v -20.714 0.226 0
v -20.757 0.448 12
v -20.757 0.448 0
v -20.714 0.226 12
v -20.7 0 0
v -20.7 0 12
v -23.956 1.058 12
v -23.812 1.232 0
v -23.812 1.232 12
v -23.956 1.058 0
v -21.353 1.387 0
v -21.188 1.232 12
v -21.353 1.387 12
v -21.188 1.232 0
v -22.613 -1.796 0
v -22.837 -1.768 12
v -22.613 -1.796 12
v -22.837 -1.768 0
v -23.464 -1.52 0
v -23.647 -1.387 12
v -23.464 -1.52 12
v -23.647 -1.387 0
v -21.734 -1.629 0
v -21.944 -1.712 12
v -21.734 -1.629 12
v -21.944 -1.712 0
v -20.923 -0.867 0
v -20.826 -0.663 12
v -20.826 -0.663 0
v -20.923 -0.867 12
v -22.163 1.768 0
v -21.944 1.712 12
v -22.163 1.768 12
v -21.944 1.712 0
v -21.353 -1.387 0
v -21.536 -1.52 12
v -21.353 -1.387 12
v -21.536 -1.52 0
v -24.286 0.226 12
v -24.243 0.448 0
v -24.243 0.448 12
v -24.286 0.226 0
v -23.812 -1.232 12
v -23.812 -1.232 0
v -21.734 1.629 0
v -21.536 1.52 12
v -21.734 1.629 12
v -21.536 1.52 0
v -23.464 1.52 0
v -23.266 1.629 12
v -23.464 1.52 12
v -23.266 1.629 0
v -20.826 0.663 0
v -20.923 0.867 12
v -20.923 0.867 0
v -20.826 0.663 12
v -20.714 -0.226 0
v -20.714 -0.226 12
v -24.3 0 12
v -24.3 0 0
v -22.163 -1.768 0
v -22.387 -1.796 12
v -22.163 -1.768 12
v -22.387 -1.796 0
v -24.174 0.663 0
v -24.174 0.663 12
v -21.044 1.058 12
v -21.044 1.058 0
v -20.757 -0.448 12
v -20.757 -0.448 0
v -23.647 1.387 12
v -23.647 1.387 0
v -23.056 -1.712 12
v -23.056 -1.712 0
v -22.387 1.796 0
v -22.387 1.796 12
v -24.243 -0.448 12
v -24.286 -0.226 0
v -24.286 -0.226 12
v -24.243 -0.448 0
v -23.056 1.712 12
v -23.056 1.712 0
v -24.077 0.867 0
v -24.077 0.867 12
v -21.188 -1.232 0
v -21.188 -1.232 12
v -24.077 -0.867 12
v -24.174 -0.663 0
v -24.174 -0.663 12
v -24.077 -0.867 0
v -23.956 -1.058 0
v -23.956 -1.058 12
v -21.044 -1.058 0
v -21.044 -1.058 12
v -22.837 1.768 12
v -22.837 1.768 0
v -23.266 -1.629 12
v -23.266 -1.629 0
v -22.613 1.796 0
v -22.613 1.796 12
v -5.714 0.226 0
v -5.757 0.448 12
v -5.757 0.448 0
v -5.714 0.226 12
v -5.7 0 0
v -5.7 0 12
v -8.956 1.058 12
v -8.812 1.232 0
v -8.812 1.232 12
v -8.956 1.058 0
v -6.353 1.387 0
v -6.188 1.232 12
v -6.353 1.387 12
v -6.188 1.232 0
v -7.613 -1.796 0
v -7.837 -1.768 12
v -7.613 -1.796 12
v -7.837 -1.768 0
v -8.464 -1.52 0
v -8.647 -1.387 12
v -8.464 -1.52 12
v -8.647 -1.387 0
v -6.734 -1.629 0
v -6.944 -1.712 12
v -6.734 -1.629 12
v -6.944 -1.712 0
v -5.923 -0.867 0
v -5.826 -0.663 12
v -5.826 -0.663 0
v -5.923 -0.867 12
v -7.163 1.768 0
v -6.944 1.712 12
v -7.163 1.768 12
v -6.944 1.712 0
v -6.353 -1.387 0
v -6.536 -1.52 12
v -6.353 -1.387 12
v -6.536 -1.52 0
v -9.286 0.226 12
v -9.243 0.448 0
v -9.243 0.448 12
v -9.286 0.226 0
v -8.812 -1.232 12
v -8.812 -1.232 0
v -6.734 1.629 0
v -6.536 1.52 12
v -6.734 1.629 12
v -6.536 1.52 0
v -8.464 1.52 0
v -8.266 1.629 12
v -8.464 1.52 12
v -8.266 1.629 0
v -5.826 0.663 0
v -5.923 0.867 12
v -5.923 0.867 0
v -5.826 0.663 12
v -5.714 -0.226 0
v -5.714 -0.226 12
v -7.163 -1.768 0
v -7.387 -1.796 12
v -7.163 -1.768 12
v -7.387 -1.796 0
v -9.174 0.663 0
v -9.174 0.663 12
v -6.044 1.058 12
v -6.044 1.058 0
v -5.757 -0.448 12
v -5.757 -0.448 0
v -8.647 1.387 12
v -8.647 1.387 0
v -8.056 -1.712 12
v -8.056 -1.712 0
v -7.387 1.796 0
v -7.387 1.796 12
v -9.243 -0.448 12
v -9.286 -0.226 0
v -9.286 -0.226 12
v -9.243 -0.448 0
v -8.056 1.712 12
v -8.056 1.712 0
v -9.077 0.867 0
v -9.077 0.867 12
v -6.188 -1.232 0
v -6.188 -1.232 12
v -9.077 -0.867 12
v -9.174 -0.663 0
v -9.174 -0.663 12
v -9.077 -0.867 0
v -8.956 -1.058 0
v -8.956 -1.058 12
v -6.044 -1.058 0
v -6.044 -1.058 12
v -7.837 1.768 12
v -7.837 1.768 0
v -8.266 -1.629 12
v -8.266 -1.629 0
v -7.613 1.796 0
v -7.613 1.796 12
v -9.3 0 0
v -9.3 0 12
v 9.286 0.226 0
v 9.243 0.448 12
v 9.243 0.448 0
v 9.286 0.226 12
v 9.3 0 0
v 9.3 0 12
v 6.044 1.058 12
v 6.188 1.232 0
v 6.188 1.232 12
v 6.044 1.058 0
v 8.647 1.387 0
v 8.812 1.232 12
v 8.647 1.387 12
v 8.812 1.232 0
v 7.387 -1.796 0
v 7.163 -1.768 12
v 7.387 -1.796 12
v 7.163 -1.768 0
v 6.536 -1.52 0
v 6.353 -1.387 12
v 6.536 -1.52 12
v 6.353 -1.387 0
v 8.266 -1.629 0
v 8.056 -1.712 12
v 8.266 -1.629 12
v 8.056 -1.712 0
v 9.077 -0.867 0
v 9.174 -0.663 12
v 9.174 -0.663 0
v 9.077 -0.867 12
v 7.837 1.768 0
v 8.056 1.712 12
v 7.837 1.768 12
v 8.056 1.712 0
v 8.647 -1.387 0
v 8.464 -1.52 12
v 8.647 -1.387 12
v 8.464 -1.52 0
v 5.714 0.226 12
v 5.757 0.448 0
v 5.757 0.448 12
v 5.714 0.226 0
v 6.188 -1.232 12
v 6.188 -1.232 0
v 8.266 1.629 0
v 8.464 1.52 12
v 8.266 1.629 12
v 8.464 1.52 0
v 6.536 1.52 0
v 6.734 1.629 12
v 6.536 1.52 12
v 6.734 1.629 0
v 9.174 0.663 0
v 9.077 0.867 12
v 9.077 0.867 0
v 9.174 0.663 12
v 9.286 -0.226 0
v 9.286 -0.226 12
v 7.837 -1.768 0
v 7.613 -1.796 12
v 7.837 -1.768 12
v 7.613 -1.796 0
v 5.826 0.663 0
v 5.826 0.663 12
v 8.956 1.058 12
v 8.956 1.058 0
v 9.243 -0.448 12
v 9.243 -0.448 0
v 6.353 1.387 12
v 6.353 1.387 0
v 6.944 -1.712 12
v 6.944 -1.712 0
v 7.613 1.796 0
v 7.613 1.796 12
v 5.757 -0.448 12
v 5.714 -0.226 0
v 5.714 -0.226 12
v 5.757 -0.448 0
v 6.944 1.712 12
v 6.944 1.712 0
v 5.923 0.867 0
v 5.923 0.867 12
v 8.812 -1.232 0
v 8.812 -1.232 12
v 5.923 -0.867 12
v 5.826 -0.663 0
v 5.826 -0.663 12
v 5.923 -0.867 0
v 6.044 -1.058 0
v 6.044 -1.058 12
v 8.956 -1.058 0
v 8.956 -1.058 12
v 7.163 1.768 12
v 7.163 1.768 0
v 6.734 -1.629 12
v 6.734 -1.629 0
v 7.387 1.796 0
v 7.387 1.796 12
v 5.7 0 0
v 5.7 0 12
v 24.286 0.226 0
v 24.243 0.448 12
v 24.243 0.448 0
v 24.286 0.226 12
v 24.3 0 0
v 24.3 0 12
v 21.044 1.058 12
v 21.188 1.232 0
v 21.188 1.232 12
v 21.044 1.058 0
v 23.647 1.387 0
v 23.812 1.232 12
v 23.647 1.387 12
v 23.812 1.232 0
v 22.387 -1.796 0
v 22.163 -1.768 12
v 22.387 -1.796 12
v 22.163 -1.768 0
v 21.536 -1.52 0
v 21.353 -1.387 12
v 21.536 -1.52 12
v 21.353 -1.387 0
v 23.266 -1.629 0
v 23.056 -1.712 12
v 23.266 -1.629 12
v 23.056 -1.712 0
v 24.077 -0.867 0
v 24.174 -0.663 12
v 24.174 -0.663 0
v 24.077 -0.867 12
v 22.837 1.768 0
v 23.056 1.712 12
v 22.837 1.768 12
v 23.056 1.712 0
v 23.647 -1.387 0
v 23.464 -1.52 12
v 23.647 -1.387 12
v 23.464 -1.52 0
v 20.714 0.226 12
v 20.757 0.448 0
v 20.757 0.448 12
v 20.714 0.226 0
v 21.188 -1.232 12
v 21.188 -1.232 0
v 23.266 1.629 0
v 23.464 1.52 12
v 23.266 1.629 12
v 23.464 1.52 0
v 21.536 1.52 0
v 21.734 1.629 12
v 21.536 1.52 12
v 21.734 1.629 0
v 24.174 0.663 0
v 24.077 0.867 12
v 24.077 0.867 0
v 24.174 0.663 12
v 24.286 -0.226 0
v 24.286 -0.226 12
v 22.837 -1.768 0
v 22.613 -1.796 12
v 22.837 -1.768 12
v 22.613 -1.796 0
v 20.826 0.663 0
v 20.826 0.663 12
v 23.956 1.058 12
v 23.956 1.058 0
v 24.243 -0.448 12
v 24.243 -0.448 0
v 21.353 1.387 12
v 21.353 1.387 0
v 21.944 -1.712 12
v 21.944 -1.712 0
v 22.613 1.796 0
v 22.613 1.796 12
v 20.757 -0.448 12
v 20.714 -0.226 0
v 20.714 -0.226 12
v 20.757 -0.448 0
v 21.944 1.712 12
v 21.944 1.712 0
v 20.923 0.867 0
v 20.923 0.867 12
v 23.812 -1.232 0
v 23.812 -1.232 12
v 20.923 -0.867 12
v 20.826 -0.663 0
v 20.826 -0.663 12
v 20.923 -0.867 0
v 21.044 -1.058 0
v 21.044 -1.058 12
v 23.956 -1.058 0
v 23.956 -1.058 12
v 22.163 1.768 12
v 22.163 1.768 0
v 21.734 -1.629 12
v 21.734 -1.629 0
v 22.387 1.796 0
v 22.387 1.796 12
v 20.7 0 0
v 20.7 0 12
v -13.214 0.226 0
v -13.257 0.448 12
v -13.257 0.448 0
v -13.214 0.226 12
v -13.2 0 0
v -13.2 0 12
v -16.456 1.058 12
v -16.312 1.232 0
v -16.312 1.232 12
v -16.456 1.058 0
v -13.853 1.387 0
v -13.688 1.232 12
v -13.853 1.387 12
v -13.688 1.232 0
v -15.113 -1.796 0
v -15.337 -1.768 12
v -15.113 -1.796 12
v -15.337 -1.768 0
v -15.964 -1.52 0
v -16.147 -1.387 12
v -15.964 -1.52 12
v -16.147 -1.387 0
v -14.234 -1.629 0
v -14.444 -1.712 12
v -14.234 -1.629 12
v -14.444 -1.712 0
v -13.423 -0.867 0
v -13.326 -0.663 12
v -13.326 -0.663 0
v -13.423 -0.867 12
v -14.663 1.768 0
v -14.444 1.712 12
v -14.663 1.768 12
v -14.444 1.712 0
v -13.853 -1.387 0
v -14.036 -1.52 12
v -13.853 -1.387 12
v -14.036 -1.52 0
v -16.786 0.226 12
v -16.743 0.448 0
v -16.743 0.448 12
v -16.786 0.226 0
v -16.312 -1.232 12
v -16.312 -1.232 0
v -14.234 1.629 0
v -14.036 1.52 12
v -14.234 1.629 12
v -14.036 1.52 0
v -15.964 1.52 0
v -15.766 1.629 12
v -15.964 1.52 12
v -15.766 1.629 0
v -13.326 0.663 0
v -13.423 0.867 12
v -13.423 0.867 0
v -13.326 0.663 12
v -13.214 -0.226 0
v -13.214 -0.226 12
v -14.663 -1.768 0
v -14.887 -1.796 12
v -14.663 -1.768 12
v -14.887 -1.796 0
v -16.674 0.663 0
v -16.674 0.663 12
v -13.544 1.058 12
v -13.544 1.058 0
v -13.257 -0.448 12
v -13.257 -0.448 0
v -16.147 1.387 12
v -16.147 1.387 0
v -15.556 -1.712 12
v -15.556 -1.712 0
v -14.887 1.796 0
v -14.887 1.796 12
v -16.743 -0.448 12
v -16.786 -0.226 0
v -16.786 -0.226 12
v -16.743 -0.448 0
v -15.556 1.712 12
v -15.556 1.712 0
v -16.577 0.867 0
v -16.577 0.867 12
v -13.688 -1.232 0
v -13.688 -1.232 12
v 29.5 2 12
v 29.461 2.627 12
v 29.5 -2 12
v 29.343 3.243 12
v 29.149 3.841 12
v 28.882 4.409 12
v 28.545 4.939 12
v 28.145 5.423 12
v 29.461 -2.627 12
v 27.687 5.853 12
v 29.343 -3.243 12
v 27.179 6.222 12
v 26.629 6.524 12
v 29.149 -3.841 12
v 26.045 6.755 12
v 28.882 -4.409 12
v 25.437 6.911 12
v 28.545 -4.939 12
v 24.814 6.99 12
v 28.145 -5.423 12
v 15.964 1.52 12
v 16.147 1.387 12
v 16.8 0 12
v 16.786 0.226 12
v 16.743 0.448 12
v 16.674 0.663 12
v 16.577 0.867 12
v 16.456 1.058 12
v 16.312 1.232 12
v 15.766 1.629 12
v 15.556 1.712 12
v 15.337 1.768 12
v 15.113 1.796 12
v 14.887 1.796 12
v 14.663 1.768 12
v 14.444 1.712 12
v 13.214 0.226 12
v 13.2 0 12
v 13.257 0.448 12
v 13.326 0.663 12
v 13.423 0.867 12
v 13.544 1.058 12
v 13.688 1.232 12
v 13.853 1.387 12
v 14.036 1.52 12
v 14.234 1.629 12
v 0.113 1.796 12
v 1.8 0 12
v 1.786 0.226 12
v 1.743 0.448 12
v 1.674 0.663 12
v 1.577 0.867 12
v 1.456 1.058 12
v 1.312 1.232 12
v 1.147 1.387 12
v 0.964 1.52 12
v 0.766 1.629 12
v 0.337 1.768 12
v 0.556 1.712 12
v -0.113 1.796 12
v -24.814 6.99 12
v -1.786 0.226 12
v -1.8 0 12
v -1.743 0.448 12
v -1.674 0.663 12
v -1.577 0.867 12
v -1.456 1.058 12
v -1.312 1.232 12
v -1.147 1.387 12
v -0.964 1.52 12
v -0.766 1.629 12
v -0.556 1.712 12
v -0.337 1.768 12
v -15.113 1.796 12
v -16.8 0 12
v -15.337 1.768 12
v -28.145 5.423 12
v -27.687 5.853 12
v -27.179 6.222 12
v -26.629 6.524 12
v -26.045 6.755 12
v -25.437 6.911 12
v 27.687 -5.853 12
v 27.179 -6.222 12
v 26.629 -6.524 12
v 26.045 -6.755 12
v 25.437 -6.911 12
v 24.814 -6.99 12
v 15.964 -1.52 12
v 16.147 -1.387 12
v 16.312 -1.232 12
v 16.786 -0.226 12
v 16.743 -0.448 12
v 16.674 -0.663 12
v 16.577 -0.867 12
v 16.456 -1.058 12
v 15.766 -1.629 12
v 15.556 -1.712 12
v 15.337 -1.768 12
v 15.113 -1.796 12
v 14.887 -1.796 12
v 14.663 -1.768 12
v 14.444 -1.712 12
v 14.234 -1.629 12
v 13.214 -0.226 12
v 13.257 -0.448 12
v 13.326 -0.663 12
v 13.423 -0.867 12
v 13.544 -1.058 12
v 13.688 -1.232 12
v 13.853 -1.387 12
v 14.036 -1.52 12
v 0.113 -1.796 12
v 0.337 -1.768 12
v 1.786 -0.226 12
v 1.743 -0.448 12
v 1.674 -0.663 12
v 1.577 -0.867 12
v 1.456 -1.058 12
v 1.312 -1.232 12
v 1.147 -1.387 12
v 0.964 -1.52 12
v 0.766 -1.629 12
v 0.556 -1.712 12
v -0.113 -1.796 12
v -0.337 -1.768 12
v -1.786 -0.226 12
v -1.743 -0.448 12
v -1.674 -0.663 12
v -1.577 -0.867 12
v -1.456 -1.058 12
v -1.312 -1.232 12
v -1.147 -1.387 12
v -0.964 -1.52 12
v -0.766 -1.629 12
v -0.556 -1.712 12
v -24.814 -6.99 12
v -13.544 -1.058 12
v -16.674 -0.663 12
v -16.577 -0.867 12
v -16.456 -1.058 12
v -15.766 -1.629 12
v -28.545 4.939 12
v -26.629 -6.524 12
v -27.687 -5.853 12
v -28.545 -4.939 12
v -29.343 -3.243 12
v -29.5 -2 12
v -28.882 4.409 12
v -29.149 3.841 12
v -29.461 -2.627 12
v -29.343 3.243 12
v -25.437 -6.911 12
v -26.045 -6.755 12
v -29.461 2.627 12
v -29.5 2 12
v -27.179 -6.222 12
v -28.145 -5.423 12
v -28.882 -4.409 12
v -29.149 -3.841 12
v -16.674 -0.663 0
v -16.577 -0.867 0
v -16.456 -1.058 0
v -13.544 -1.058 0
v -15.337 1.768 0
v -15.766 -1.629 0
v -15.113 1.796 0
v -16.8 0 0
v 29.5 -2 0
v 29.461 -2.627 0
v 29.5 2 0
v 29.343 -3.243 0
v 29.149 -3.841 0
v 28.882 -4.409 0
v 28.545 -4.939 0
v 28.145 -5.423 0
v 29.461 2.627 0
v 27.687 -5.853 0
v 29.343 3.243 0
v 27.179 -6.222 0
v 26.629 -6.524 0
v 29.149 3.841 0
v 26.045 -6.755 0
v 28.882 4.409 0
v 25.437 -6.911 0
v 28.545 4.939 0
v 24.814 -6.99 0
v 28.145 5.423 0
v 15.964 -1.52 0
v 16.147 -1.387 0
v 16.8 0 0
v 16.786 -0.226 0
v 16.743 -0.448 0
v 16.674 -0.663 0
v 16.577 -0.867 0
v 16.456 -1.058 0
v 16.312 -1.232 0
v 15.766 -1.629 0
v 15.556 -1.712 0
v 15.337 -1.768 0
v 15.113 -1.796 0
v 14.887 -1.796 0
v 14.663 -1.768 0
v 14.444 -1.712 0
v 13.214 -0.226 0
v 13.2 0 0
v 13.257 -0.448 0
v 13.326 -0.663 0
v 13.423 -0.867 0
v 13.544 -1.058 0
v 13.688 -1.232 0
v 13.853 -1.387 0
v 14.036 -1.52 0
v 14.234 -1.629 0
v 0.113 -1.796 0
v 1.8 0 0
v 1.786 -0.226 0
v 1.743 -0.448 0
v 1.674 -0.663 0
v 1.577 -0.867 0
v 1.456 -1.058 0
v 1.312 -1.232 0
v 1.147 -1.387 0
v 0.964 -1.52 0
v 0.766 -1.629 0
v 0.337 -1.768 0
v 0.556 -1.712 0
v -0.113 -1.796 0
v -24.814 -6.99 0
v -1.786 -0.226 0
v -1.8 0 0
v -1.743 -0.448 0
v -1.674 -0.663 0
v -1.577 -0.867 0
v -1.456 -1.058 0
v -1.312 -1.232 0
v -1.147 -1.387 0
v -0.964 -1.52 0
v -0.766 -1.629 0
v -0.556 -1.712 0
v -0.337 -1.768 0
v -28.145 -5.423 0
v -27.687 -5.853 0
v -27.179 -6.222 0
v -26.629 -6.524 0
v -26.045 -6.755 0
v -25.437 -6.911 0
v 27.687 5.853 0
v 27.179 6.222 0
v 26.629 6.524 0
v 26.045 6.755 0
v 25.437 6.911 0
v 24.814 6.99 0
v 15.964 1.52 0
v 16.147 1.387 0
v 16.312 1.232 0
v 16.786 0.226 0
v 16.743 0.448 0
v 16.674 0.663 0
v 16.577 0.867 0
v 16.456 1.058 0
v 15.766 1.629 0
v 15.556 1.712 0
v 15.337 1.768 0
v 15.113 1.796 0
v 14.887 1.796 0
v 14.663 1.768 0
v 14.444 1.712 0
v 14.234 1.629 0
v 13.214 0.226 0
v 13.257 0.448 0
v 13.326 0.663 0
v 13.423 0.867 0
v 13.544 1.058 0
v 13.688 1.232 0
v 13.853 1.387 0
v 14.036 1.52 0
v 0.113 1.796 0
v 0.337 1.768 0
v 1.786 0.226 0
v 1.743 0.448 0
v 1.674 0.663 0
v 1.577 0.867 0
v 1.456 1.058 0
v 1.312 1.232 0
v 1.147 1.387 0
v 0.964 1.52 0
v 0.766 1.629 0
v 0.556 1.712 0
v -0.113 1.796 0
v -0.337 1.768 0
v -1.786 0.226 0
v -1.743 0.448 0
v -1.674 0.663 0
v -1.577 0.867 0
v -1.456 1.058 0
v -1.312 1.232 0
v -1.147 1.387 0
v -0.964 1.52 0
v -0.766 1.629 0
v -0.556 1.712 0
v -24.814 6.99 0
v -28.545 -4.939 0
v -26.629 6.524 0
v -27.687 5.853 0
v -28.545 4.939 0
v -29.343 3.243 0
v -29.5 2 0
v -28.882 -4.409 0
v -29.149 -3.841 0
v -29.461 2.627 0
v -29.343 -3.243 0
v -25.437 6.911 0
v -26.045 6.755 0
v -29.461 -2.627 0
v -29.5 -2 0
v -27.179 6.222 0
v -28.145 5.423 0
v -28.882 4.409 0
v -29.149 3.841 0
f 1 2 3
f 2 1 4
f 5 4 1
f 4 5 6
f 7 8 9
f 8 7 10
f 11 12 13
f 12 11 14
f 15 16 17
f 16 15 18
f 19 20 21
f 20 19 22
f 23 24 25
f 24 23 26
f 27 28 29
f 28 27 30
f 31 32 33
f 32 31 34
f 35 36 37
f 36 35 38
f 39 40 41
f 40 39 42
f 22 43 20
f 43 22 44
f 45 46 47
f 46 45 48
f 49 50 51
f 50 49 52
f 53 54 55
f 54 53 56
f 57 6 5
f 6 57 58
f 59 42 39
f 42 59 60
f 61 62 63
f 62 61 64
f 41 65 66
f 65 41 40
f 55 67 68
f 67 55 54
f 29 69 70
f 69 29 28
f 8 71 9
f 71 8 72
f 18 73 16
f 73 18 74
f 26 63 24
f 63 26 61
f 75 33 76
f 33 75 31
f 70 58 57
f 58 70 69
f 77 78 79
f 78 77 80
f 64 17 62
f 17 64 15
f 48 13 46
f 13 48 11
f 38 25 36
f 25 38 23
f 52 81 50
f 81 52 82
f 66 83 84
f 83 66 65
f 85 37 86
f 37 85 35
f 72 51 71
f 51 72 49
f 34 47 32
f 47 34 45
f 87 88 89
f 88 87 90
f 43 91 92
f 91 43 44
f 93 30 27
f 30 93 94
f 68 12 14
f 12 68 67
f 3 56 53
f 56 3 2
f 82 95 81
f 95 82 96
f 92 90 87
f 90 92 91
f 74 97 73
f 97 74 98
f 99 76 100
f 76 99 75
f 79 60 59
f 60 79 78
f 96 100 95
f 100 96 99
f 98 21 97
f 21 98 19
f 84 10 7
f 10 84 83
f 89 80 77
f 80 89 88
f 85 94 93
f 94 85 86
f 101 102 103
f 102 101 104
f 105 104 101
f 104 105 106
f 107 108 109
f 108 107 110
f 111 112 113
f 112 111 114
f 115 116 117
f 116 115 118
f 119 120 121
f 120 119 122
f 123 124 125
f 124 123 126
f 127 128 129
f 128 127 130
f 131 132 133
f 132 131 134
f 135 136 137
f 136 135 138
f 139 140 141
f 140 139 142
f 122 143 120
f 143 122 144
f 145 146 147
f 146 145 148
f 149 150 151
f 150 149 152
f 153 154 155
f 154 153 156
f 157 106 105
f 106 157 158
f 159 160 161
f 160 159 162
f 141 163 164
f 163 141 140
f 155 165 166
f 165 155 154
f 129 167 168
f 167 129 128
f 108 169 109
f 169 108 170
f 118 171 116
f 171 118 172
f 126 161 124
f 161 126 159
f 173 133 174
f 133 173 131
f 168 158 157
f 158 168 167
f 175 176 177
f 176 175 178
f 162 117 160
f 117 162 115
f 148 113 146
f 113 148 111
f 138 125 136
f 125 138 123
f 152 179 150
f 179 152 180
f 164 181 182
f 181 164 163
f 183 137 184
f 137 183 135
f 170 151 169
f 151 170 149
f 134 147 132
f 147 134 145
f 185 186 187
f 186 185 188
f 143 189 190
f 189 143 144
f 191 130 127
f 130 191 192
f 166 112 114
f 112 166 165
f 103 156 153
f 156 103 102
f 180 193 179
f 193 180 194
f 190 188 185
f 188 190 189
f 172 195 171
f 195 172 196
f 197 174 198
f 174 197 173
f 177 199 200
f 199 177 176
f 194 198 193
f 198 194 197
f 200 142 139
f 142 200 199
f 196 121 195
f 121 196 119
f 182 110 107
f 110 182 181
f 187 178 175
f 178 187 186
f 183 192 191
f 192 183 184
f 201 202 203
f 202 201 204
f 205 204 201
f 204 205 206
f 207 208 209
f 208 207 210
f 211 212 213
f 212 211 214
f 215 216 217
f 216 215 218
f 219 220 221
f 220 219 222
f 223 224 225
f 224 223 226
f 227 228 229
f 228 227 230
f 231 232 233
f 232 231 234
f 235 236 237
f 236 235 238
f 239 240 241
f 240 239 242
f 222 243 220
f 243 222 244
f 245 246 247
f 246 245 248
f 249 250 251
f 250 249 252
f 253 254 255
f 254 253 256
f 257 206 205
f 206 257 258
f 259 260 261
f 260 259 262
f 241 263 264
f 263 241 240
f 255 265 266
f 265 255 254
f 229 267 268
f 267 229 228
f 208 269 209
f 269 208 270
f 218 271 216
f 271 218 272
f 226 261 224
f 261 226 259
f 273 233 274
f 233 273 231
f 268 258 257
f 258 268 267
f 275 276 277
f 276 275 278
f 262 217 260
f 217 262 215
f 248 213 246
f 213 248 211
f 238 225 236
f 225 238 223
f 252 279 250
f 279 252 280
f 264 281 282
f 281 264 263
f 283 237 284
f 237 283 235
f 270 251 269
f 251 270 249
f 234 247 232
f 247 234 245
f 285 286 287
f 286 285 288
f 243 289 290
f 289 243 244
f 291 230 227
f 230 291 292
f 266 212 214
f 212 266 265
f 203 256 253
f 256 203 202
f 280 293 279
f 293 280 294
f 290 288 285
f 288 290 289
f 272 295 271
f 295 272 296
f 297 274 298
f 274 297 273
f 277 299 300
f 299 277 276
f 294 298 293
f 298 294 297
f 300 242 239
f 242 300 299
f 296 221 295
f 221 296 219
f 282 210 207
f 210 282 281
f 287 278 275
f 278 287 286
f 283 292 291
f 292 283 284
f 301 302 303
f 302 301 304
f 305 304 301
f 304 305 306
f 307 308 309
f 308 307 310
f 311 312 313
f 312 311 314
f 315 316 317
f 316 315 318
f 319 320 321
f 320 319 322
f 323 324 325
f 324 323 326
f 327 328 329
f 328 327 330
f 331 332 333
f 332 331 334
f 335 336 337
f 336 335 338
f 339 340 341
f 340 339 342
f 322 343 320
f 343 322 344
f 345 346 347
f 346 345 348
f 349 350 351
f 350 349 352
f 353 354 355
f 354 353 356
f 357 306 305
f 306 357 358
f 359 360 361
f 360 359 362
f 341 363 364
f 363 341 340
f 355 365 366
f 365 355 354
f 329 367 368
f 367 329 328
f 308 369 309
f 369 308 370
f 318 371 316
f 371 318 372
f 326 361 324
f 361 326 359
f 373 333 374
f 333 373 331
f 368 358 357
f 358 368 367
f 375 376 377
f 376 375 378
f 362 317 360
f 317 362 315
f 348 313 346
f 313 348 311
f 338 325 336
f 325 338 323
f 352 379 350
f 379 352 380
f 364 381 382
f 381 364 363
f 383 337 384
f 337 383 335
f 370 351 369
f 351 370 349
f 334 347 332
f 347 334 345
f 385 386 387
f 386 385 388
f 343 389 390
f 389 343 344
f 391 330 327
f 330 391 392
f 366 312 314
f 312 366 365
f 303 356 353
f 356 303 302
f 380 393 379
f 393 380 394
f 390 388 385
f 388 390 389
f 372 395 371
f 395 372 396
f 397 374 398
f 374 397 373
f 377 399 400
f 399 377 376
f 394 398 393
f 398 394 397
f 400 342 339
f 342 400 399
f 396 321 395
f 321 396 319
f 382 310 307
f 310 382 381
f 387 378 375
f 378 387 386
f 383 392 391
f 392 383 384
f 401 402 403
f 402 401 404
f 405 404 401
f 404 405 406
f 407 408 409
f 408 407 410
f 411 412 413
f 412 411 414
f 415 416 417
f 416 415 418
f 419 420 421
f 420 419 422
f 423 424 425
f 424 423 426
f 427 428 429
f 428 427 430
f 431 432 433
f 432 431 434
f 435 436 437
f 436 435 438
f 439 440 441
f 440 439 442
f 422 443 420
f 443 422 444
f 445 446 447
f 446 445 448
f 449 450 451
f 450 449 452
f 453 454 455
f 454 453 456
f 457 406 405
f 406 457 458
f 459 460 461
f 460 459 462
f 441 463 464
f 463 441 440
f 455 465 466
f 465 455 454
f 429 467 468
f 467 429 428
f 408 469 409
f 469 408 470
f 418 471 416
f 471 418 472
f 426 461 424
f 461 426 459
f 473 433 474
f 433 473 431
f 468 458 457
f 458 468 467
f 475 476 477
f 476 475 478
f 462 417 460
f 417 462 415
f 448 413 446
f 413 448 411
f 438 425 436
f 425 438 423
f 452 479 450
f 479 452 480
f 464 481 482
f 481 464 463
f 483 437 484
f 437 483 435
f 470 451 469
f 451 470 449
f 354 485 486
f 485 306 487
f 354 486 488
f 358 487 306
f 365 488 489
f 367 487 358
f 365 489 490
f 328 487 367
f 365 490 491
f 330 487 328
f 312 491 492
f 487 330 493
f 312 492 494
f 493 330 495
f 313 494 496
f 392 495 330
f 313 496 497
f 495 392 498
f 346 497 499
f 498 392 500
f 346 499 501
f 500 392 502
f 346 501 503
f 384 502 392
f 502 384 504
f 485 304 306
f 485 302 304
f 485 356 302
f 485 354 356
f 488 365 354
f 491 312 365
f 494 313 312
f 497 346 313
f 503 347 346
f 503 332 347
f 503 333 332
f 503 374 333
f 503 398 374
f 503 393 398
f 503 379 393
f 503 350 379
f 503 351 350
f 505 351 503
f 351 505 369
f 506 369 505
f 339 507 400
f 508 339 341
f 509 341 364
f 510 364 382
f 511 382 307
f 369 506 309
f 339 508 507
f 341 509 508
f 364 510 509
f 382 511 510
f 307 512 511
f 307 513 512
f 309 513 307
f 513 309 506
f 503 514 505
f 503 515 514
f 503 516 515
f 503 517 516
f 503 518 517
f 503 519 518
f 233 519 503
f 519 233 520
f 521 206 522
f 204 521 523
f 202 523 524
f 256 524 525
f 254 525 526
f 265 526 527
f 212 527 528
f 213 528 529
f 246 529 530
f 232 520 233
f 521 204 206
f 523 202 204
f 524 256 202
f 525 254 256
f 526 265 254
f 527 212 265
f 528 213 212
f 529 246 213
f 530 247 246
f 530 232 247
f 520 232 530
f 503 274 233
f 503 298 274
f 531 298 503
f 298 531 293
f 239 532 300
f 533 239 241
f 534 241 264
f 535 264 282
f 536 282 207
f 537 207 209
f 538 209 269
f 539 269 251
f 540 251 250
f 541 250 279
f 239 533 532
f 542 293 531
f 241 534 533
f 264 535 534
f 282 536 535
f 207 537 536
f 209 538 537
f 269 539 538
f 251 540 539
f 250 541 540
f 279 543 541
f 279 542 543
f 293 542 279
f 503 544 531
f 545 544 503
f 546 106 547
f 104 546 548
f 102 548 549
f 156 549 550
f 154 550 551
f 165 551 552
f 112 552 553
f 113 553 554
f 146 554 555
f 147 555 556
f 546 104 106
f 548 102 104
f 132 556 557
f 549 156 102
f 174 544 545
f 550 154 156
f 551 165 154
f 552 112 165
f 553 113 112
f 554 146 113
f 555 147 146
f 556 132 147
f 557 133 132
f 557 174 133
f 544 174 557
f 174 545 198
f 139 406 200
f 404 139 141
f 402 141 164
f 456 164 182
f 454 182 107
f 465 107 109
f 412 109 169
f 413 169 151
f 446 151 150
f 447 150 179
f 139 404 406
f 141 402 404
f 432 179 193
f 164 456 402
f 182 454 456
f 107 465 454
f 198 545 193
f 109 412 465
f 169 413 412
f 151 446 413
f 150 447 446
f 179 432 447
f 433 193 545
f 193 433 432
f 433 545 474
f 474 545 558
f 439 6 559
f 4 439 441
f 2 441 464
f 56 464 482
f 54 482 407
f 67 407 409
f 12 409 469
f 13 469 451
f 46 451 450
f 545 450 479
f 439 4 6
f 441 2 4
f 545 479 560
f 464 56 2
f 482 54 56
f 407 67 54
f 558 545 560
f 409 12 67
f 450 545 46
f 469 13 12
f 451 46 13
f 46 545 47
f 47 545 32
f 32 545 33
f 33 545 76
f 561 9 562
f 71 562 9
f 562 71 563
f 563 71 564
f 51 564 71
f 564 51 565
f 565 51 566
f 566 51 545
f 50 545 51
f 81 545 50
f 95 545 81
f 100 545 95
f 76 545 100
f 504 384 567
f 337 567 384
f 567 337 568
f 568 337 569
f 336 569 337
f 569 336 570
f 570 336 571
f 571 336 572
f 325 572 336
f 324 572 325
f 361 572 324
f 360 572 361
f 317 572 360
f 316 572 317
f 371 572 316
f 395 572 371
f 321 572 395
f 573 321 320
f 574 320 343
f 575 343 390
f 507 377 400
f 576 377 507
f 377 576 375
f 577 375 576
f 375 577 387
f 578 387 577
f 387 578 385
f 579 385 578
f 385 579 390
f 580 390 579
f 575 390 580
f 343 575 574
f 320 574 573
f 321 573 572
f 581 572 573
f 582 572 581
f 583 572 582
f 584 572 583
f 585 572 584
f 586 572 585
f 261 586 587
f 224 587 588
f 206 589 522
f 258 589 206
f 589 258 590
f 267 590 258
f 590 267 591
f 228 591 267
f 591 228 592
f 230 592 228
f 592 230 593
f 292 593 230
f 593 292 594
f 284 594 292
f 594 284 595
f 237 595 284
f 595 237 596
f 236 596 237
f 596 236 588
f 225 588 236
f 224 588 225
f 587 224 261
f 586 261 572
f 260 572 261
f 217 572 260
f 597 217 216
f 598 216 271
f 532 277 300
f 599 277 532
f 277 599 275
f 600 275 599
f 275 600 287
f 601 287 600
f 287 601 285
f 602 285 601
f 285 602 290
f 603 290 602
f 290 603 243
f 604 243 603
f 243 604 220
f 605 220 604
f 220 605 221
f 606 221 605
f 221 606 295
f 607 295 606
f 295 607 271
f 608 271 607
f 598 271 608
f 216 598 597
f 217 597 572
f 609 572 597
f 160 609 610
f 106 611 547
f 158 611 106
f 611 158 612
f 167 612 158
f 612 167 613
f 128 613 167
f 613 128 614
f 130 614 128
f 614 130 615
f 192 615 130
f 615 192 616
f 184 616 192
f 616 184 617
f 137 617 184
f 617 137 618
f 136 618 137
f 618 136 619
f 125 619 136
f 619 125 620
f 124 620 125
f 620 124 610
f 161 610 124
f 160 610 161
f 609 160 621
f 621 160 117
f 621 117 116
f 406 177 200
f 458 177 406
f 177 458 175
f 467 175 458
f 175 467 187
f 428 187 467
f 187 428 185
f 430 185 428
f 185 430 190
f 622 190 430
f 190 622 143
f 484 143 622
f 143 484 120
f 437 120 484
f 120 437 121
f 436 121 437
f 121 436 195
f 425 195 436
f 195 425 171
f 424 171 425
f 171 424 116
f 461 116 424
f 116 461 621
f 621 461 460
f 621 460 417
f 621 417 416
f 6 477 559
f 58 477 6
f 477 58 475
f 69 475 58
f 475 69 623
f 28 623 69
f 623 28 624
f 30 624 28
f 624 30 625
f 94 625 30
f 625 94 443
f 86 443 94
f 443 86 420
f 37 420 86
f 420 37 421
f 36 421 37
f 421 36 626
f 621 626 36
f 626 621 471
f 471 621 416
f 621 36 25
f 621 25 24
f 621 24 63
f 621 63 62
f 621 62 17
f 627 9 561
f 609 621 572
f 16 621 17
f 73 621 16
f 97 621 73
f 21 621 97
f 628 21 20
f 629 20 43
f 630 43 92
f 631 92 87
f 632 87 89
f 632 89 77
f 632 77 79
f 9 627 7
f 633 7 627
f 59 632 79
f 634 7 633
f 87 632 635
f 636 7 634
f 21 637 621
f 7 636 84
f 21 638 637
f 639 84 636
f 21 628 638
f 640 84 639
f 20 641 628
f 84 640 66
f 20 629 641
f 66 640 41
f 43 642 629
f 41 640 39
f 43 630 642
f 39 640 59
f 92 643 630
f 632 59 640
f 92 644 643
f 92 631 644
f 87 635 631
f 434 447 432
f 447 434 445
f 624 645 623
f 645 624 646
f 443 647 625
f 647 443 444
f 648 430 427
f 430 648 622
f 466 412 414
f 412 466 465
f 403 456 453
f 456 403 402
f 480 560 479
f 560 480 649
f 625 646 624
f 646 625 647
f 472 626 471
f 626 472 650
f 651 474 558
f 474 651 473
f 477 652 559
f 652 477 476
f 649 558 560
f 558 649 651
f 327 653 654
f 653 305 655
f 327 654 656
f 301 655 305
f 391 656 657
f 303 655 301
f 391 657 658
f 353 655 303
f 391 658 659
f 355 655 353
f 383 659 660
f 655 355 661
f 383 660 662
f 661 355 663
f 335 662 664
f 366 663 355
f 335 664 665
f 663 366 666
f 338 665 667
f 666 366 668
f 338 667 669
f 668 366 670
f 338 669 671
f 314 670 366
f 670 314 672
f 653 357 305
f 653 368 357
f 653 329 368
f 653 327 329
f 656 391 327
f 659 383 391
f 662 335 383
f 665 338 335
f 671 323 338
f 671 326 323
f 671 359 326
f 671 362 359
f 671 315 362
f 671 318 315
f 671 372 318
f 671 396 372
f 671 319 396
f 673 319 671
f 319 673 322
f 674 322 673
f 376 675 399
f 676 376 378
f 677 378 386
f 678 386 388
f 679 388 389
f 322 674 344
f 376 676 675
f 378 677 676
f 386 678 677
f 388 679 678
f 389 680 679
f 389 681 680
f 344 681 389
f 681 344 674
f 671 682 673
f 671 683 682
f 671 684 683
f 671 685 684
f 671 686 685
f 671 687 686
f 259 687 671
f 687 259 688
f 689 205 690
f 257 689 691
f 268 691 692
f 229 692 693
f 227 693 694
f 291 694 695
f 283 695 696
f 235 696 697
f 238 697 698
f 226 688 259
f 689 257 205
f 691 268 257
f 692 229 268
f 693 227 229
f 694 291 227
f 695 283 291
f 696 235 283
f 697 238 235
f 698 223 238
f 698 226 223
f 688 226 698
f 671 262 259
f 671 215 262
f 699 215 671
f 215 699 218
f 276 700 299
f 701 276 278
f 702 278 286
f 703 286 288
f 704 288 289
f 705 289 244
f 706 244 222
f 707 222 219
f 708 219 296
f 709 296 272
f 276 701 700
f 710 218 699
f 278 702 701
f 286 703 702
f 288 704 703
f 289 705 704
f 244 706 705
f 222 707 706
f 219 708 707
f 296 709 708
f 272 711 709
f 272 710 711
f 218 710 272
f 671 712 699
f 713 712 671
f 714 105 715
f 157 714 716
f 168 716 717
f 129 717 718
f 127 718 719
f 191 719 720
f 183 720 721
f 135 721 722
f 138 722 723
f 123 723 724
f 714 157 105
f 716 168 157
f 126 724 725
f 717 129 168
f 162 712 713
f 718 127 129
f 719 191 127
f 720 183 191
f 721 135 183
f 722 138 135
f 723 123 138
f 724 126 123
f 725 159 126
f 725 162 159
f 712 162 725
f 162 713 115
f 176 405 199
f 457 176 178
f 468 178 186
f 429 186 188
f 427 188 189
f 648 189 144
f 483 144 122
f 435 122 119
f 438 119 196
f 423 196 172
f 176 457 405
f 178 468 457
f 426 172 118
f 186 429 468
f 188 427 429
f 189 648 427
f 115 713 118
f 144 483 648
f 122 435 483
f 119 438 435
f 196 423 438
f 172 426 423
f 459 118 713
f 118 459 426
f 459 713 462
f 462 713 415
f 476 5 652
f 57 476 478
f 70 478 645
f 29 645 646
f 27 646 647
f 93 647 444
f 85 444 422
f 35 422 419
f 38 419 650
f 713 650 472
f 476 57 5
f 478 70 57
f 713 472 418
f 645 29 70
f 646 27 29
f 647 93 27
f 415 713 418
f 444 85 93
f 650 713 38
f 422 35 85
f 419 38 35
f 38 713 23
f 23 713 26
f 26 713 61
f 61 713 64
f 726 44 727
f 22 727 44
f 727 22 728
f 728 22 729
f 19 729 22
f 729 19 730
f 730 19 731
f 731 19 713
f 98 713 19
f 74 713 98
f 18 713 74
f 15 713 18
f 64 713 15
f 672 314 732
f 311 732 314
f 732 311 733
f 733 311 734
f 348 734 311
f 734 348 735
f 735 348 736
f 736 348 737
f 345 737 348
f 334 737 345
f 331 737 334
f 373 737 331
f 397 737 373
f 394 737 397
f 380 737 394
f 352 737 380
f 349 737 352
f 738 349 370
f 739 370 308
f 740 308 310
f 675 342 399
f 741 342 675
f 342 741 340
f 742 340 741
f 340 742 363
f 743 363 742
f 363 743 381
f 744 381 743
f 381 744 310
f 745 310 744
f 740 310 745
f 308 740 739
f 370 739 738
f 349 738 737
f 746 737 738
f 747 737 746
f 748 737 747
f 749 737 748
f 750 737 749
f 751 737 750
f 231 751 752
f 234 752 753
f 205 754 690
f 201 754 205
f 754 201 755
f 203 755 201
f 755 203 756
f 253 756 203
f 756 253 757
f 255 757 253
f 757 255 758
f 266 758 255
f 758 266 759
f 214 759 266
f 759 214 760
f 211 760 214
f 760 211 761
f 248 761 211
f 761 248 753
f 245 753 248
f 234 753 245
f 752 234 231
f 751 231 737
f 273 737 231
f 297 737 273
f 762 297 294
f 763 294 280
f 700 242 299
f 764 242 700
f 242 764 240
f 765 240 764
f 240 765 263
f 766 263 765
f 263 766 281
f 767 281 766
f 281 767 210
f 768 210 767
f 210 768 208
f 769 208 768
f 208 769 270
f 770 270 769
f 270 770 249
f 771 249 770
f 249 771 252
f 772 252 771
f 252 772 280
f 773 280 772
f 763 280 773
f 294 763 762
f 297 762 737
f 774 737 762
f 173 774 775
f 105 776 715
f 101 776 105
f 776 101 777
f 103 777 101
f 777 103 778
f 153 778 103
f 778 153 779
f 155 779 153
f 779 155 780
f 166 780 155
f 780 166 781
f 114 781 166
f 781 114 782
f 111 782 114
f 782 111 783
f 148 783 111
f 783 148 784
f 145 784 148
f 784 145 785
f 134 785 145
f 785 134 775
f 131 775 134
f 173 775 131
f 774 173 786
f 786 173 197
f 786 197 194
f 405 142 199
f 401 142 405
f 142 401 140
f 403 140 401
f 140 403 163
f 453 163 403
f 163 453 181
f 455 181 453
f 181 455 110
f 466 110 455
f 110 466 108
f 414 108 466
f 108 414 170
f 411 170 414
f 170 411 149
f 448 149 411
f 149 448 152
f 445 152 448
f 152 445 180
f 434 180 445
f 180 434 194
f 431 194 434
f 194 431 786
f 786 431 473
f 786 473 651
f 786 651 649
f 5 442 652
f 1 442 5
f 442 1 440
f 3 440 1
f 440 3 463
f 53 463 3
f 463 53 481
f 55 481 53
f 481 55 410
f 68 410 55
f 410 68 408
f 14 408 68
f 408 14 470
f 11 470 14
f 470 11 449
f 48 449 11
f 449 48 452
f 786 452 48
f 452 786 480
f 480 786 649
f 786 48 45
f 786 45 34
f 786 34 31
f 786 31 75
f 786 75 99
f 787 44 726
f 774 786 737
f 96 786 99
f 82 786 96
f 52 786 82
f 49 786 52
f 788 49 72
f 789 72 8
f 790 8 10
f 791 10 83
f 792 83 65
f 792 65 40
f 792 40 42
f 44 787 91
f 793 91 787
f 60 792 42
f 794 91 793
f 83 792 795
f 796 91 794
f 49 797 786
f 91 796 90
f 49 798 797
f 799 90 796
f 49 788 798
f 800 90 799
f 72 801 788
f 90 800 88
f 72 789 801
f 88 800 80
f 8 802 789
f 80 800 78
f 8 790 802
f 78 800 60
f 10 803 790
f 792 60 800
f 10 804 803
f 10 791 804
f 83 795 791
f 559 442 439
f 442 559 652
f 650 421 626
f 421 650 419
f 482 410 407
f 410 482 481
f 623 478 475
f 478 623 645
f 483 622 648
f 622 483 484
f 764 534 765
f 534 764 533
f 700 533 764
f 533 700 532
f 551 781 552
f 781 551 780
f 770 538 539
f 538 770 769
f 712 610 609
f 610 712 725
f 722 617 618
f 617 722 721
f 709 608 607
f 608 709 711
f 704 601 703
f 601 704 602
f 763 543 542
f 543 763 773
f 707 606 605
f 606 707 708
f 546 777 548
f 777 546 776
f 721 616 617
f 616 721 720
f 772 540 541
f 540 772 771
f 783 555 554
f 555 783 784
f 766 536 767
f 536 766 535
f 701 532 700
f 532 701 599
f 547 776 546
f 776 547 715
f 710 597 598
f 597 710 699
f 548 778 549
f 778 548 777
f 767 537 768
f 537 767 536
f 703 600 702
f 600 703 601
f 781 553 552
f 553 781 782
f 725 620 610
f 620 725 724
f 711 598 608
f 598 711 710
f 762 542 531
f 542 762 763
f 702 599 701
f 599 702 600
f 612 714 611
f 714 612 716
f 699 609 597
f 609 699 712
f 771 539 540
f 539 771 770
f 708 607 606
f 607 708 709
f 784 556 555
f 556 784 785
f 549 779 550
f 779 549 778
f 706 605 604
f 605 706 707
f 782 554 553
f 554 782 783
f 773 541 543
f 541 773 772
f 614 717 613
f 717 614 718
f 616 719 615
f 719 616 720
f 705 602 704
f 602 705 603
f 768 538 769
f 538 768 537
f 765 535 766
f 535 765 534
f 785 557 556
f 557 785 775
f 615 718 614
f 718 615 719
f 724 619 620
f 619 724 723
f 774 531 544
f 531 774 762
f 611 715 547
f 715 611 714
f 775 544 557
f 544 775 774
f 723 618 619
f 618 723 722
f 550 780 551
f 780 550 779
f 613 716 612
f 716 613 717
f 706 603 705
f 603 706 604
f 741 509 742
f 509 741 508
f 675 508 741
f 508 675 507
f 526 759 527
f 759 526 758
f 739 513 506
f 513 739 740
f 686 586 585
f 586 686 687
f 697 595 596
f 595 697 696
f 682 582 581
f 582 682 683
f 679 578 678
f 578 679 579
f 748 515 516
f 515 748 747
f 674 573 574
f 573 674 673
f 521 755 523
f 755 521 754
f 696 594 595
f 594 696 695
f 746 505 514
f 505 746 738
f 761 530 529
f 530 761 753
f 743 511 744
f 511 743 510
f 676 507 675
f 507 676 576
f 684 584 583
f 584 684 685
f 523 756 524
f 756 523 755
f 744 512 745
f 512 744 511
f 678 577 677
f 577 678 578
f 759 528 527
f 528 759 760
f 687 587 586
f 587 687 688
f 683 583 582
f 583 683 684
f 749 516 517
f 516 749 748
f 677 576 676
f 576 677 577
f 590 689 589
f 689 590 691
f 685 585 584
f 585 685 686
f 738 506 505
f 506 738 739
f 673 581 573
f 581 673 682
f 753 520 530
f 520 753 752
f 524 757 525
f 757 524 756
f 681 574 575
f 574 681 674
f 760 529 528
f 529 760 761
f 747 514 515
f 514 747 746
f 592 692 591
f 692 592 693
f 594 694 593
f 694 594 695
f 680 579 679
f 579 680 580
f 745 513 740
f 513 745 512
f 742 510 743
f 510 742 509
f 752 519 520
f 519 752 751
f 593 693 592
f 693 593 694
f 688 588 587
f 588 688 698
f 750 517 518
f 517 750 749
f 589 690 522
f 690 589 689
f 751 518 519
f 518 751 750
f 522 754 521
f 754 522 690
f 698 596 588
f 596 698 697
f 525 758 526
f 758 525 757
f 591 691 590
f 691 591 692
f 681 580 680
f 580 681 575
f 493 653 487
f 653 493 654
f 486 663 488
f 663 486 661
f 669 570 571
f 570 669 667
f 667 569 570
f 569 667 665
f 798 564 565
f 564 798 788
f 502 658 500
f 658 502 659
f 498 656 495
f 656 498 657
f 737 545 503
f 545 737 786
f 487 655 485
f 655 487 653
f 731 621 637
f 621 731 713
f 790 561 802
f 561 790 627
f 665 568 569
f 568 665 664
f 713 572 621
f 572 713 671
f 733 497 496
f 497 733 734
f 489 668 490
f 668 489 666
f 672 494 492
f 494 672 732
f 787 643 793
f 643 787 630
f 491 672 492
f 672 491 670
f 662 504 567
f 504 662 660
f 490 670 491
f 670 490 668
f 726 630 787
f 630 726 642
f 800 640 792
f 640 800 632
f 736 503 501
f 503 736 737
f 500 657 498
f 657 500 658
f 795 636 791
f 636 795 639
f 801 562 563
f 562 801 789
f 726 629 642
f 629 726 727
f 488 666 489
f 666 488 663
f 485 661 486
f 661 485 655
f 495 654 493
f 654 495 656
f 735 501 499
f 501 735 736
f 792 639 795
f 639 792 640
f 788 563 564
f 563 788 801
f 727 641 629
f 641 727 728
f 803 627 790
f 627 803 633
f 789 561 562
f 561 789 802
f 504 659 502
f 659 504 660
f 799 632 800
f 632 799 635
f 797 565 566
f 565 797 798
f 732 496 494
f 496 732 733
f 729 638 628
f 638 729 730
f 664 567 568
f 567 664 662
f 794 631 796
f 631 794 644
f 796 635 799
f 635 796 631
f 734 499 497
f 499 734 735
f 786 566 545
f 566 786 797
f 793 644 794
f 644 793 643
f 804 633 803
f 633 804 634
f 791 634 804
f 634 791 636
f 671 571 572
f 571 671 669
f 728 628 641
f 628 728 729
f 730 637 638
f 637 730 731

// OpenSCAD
$fn = 50;


difference() {
	union() {
		hull() {
			translate(v = [-24.5000000000, 2.0000000000, 0]) {
				cylinder(h = 12, r = 5);
			}
			translate(v = [24.5000000000, 2.0000000000, 0]) {
				cylinder(h = 12, r = 5);
			}
			translate(v = [-24.5000000000, -2.0000000000, 0]) {
				cylinder(h = 12, r = 5);
			}
			translate(v = [24.5000000000, -2.0000000000, 0]) {
				cylinder(h = 12, r = 5);
			}
		}
	}
	union() {
		translate(v = [-22.5000000000, 0.0000000000, -100.0000000000]) {
			cylinder(h = 200, r = 1.8000000000);
		}
		translate(v = [-7.5000000000, 0.0000000000, -100.0000000000]) {
			cylinder(h = 200, r = 1.8000000000);
		}
		translate(v = [7.5000000000, 0.0000000000, -100.0000000000]) {
			cylinder(h = 200, r = 1.8000000000);
		}
		translate(v = [22.5000000000, 0.0000000000, -100.0000000000]) {
			cylinder(h = 200, r = 1.8000000000);
		}
		translate(v = [-22.5000000000, 0.0000000000, 0]) {
			cylinder(h = 12, r = 1.8000000000);
		}
		translate(v = [-15.0000000000, 0.0000000000, 0]) {
			cylinder(h = 12, r = 1.8000000000);
		}
		translate(v = [-7.5000000000, 0.0000000000, 0]) {
			cylinder(h = 12, r = 1.8000000000);
		}
		cylinder(h = 12, r = 1.8000000000);
		translate(v = [7.5000000000, 0.0000000000, 0]) {
			cylinder(h = 12, r = 1.8000000000);
		}
		translate(v = [15.0000000000, 0.0000000000, 0]) {
			cylinder(h = 12, r = 1.8000000000);
		}
		translate(v = [22.5000000000, 0.0000000000, 0]) {
			cylinder(h = 12, r = 1.8000000000);
		}
		translate(v = [-22.5000000000, 0.0000000000, 0]) {
			cylinder(h = 12, r = 1.8000000000);
		}
		translate(v = [-15.0000000000, 0.0000000000, 0]) {
			cylinder(h = 12, r = 1.8000000000);
		}
		translate(v = [-7.5000000000, 0.0000000000, 0]) {
			cylinder(h = 12, r = 1.8000000000);
		}
		cylinder(h = 12, r = 1.8000000000);
		translate(v = [7.5000000000, 0.0000000000, 0]) {
			cylinder(h = 12, r = 1.8000000000);
		}
		translate(v = [15.0000000000, 0.0000000000, 0]) {
			cylinder(h = 12, r = 1.8000000000);
		}
		translate(v = [22.5000000000, 0.0000000000, 0]) {
			cylinder(h = 12, r = 1.8000000000);
		}
		translate(v = [-22.5000000000, 0.0000000000, 0]) {
			cylinder(h = 12, r = 1.8000000000);
		}
		translate(v = [-15.0000000000, 0.0000000000, 0]) {
			cylinder(h = 12, r = 1.8000000000);
		}
		translate(v = [-7.5000000000, 0.0000000000, 0]) {
			cylinder(h = 12, r = 1.8000000000);
		}
		cylinder(h = 12, r = 1.8000000000);
		translate(v = [7.5000000000, 0.0000000000, 0]) {
			cylinder(h = 12, r = 1.8000000000);
		}
		translate(v = [15.0000000000, 0.0000000000, 0]) {
			cylinder(h = 12, r = 1.8000000000);
		}
		translate(v = [22.5000000000, 0.0000000000, 0]) {
			cylinder(h = 12, r = 1.8000000000);
		}
	}
}
